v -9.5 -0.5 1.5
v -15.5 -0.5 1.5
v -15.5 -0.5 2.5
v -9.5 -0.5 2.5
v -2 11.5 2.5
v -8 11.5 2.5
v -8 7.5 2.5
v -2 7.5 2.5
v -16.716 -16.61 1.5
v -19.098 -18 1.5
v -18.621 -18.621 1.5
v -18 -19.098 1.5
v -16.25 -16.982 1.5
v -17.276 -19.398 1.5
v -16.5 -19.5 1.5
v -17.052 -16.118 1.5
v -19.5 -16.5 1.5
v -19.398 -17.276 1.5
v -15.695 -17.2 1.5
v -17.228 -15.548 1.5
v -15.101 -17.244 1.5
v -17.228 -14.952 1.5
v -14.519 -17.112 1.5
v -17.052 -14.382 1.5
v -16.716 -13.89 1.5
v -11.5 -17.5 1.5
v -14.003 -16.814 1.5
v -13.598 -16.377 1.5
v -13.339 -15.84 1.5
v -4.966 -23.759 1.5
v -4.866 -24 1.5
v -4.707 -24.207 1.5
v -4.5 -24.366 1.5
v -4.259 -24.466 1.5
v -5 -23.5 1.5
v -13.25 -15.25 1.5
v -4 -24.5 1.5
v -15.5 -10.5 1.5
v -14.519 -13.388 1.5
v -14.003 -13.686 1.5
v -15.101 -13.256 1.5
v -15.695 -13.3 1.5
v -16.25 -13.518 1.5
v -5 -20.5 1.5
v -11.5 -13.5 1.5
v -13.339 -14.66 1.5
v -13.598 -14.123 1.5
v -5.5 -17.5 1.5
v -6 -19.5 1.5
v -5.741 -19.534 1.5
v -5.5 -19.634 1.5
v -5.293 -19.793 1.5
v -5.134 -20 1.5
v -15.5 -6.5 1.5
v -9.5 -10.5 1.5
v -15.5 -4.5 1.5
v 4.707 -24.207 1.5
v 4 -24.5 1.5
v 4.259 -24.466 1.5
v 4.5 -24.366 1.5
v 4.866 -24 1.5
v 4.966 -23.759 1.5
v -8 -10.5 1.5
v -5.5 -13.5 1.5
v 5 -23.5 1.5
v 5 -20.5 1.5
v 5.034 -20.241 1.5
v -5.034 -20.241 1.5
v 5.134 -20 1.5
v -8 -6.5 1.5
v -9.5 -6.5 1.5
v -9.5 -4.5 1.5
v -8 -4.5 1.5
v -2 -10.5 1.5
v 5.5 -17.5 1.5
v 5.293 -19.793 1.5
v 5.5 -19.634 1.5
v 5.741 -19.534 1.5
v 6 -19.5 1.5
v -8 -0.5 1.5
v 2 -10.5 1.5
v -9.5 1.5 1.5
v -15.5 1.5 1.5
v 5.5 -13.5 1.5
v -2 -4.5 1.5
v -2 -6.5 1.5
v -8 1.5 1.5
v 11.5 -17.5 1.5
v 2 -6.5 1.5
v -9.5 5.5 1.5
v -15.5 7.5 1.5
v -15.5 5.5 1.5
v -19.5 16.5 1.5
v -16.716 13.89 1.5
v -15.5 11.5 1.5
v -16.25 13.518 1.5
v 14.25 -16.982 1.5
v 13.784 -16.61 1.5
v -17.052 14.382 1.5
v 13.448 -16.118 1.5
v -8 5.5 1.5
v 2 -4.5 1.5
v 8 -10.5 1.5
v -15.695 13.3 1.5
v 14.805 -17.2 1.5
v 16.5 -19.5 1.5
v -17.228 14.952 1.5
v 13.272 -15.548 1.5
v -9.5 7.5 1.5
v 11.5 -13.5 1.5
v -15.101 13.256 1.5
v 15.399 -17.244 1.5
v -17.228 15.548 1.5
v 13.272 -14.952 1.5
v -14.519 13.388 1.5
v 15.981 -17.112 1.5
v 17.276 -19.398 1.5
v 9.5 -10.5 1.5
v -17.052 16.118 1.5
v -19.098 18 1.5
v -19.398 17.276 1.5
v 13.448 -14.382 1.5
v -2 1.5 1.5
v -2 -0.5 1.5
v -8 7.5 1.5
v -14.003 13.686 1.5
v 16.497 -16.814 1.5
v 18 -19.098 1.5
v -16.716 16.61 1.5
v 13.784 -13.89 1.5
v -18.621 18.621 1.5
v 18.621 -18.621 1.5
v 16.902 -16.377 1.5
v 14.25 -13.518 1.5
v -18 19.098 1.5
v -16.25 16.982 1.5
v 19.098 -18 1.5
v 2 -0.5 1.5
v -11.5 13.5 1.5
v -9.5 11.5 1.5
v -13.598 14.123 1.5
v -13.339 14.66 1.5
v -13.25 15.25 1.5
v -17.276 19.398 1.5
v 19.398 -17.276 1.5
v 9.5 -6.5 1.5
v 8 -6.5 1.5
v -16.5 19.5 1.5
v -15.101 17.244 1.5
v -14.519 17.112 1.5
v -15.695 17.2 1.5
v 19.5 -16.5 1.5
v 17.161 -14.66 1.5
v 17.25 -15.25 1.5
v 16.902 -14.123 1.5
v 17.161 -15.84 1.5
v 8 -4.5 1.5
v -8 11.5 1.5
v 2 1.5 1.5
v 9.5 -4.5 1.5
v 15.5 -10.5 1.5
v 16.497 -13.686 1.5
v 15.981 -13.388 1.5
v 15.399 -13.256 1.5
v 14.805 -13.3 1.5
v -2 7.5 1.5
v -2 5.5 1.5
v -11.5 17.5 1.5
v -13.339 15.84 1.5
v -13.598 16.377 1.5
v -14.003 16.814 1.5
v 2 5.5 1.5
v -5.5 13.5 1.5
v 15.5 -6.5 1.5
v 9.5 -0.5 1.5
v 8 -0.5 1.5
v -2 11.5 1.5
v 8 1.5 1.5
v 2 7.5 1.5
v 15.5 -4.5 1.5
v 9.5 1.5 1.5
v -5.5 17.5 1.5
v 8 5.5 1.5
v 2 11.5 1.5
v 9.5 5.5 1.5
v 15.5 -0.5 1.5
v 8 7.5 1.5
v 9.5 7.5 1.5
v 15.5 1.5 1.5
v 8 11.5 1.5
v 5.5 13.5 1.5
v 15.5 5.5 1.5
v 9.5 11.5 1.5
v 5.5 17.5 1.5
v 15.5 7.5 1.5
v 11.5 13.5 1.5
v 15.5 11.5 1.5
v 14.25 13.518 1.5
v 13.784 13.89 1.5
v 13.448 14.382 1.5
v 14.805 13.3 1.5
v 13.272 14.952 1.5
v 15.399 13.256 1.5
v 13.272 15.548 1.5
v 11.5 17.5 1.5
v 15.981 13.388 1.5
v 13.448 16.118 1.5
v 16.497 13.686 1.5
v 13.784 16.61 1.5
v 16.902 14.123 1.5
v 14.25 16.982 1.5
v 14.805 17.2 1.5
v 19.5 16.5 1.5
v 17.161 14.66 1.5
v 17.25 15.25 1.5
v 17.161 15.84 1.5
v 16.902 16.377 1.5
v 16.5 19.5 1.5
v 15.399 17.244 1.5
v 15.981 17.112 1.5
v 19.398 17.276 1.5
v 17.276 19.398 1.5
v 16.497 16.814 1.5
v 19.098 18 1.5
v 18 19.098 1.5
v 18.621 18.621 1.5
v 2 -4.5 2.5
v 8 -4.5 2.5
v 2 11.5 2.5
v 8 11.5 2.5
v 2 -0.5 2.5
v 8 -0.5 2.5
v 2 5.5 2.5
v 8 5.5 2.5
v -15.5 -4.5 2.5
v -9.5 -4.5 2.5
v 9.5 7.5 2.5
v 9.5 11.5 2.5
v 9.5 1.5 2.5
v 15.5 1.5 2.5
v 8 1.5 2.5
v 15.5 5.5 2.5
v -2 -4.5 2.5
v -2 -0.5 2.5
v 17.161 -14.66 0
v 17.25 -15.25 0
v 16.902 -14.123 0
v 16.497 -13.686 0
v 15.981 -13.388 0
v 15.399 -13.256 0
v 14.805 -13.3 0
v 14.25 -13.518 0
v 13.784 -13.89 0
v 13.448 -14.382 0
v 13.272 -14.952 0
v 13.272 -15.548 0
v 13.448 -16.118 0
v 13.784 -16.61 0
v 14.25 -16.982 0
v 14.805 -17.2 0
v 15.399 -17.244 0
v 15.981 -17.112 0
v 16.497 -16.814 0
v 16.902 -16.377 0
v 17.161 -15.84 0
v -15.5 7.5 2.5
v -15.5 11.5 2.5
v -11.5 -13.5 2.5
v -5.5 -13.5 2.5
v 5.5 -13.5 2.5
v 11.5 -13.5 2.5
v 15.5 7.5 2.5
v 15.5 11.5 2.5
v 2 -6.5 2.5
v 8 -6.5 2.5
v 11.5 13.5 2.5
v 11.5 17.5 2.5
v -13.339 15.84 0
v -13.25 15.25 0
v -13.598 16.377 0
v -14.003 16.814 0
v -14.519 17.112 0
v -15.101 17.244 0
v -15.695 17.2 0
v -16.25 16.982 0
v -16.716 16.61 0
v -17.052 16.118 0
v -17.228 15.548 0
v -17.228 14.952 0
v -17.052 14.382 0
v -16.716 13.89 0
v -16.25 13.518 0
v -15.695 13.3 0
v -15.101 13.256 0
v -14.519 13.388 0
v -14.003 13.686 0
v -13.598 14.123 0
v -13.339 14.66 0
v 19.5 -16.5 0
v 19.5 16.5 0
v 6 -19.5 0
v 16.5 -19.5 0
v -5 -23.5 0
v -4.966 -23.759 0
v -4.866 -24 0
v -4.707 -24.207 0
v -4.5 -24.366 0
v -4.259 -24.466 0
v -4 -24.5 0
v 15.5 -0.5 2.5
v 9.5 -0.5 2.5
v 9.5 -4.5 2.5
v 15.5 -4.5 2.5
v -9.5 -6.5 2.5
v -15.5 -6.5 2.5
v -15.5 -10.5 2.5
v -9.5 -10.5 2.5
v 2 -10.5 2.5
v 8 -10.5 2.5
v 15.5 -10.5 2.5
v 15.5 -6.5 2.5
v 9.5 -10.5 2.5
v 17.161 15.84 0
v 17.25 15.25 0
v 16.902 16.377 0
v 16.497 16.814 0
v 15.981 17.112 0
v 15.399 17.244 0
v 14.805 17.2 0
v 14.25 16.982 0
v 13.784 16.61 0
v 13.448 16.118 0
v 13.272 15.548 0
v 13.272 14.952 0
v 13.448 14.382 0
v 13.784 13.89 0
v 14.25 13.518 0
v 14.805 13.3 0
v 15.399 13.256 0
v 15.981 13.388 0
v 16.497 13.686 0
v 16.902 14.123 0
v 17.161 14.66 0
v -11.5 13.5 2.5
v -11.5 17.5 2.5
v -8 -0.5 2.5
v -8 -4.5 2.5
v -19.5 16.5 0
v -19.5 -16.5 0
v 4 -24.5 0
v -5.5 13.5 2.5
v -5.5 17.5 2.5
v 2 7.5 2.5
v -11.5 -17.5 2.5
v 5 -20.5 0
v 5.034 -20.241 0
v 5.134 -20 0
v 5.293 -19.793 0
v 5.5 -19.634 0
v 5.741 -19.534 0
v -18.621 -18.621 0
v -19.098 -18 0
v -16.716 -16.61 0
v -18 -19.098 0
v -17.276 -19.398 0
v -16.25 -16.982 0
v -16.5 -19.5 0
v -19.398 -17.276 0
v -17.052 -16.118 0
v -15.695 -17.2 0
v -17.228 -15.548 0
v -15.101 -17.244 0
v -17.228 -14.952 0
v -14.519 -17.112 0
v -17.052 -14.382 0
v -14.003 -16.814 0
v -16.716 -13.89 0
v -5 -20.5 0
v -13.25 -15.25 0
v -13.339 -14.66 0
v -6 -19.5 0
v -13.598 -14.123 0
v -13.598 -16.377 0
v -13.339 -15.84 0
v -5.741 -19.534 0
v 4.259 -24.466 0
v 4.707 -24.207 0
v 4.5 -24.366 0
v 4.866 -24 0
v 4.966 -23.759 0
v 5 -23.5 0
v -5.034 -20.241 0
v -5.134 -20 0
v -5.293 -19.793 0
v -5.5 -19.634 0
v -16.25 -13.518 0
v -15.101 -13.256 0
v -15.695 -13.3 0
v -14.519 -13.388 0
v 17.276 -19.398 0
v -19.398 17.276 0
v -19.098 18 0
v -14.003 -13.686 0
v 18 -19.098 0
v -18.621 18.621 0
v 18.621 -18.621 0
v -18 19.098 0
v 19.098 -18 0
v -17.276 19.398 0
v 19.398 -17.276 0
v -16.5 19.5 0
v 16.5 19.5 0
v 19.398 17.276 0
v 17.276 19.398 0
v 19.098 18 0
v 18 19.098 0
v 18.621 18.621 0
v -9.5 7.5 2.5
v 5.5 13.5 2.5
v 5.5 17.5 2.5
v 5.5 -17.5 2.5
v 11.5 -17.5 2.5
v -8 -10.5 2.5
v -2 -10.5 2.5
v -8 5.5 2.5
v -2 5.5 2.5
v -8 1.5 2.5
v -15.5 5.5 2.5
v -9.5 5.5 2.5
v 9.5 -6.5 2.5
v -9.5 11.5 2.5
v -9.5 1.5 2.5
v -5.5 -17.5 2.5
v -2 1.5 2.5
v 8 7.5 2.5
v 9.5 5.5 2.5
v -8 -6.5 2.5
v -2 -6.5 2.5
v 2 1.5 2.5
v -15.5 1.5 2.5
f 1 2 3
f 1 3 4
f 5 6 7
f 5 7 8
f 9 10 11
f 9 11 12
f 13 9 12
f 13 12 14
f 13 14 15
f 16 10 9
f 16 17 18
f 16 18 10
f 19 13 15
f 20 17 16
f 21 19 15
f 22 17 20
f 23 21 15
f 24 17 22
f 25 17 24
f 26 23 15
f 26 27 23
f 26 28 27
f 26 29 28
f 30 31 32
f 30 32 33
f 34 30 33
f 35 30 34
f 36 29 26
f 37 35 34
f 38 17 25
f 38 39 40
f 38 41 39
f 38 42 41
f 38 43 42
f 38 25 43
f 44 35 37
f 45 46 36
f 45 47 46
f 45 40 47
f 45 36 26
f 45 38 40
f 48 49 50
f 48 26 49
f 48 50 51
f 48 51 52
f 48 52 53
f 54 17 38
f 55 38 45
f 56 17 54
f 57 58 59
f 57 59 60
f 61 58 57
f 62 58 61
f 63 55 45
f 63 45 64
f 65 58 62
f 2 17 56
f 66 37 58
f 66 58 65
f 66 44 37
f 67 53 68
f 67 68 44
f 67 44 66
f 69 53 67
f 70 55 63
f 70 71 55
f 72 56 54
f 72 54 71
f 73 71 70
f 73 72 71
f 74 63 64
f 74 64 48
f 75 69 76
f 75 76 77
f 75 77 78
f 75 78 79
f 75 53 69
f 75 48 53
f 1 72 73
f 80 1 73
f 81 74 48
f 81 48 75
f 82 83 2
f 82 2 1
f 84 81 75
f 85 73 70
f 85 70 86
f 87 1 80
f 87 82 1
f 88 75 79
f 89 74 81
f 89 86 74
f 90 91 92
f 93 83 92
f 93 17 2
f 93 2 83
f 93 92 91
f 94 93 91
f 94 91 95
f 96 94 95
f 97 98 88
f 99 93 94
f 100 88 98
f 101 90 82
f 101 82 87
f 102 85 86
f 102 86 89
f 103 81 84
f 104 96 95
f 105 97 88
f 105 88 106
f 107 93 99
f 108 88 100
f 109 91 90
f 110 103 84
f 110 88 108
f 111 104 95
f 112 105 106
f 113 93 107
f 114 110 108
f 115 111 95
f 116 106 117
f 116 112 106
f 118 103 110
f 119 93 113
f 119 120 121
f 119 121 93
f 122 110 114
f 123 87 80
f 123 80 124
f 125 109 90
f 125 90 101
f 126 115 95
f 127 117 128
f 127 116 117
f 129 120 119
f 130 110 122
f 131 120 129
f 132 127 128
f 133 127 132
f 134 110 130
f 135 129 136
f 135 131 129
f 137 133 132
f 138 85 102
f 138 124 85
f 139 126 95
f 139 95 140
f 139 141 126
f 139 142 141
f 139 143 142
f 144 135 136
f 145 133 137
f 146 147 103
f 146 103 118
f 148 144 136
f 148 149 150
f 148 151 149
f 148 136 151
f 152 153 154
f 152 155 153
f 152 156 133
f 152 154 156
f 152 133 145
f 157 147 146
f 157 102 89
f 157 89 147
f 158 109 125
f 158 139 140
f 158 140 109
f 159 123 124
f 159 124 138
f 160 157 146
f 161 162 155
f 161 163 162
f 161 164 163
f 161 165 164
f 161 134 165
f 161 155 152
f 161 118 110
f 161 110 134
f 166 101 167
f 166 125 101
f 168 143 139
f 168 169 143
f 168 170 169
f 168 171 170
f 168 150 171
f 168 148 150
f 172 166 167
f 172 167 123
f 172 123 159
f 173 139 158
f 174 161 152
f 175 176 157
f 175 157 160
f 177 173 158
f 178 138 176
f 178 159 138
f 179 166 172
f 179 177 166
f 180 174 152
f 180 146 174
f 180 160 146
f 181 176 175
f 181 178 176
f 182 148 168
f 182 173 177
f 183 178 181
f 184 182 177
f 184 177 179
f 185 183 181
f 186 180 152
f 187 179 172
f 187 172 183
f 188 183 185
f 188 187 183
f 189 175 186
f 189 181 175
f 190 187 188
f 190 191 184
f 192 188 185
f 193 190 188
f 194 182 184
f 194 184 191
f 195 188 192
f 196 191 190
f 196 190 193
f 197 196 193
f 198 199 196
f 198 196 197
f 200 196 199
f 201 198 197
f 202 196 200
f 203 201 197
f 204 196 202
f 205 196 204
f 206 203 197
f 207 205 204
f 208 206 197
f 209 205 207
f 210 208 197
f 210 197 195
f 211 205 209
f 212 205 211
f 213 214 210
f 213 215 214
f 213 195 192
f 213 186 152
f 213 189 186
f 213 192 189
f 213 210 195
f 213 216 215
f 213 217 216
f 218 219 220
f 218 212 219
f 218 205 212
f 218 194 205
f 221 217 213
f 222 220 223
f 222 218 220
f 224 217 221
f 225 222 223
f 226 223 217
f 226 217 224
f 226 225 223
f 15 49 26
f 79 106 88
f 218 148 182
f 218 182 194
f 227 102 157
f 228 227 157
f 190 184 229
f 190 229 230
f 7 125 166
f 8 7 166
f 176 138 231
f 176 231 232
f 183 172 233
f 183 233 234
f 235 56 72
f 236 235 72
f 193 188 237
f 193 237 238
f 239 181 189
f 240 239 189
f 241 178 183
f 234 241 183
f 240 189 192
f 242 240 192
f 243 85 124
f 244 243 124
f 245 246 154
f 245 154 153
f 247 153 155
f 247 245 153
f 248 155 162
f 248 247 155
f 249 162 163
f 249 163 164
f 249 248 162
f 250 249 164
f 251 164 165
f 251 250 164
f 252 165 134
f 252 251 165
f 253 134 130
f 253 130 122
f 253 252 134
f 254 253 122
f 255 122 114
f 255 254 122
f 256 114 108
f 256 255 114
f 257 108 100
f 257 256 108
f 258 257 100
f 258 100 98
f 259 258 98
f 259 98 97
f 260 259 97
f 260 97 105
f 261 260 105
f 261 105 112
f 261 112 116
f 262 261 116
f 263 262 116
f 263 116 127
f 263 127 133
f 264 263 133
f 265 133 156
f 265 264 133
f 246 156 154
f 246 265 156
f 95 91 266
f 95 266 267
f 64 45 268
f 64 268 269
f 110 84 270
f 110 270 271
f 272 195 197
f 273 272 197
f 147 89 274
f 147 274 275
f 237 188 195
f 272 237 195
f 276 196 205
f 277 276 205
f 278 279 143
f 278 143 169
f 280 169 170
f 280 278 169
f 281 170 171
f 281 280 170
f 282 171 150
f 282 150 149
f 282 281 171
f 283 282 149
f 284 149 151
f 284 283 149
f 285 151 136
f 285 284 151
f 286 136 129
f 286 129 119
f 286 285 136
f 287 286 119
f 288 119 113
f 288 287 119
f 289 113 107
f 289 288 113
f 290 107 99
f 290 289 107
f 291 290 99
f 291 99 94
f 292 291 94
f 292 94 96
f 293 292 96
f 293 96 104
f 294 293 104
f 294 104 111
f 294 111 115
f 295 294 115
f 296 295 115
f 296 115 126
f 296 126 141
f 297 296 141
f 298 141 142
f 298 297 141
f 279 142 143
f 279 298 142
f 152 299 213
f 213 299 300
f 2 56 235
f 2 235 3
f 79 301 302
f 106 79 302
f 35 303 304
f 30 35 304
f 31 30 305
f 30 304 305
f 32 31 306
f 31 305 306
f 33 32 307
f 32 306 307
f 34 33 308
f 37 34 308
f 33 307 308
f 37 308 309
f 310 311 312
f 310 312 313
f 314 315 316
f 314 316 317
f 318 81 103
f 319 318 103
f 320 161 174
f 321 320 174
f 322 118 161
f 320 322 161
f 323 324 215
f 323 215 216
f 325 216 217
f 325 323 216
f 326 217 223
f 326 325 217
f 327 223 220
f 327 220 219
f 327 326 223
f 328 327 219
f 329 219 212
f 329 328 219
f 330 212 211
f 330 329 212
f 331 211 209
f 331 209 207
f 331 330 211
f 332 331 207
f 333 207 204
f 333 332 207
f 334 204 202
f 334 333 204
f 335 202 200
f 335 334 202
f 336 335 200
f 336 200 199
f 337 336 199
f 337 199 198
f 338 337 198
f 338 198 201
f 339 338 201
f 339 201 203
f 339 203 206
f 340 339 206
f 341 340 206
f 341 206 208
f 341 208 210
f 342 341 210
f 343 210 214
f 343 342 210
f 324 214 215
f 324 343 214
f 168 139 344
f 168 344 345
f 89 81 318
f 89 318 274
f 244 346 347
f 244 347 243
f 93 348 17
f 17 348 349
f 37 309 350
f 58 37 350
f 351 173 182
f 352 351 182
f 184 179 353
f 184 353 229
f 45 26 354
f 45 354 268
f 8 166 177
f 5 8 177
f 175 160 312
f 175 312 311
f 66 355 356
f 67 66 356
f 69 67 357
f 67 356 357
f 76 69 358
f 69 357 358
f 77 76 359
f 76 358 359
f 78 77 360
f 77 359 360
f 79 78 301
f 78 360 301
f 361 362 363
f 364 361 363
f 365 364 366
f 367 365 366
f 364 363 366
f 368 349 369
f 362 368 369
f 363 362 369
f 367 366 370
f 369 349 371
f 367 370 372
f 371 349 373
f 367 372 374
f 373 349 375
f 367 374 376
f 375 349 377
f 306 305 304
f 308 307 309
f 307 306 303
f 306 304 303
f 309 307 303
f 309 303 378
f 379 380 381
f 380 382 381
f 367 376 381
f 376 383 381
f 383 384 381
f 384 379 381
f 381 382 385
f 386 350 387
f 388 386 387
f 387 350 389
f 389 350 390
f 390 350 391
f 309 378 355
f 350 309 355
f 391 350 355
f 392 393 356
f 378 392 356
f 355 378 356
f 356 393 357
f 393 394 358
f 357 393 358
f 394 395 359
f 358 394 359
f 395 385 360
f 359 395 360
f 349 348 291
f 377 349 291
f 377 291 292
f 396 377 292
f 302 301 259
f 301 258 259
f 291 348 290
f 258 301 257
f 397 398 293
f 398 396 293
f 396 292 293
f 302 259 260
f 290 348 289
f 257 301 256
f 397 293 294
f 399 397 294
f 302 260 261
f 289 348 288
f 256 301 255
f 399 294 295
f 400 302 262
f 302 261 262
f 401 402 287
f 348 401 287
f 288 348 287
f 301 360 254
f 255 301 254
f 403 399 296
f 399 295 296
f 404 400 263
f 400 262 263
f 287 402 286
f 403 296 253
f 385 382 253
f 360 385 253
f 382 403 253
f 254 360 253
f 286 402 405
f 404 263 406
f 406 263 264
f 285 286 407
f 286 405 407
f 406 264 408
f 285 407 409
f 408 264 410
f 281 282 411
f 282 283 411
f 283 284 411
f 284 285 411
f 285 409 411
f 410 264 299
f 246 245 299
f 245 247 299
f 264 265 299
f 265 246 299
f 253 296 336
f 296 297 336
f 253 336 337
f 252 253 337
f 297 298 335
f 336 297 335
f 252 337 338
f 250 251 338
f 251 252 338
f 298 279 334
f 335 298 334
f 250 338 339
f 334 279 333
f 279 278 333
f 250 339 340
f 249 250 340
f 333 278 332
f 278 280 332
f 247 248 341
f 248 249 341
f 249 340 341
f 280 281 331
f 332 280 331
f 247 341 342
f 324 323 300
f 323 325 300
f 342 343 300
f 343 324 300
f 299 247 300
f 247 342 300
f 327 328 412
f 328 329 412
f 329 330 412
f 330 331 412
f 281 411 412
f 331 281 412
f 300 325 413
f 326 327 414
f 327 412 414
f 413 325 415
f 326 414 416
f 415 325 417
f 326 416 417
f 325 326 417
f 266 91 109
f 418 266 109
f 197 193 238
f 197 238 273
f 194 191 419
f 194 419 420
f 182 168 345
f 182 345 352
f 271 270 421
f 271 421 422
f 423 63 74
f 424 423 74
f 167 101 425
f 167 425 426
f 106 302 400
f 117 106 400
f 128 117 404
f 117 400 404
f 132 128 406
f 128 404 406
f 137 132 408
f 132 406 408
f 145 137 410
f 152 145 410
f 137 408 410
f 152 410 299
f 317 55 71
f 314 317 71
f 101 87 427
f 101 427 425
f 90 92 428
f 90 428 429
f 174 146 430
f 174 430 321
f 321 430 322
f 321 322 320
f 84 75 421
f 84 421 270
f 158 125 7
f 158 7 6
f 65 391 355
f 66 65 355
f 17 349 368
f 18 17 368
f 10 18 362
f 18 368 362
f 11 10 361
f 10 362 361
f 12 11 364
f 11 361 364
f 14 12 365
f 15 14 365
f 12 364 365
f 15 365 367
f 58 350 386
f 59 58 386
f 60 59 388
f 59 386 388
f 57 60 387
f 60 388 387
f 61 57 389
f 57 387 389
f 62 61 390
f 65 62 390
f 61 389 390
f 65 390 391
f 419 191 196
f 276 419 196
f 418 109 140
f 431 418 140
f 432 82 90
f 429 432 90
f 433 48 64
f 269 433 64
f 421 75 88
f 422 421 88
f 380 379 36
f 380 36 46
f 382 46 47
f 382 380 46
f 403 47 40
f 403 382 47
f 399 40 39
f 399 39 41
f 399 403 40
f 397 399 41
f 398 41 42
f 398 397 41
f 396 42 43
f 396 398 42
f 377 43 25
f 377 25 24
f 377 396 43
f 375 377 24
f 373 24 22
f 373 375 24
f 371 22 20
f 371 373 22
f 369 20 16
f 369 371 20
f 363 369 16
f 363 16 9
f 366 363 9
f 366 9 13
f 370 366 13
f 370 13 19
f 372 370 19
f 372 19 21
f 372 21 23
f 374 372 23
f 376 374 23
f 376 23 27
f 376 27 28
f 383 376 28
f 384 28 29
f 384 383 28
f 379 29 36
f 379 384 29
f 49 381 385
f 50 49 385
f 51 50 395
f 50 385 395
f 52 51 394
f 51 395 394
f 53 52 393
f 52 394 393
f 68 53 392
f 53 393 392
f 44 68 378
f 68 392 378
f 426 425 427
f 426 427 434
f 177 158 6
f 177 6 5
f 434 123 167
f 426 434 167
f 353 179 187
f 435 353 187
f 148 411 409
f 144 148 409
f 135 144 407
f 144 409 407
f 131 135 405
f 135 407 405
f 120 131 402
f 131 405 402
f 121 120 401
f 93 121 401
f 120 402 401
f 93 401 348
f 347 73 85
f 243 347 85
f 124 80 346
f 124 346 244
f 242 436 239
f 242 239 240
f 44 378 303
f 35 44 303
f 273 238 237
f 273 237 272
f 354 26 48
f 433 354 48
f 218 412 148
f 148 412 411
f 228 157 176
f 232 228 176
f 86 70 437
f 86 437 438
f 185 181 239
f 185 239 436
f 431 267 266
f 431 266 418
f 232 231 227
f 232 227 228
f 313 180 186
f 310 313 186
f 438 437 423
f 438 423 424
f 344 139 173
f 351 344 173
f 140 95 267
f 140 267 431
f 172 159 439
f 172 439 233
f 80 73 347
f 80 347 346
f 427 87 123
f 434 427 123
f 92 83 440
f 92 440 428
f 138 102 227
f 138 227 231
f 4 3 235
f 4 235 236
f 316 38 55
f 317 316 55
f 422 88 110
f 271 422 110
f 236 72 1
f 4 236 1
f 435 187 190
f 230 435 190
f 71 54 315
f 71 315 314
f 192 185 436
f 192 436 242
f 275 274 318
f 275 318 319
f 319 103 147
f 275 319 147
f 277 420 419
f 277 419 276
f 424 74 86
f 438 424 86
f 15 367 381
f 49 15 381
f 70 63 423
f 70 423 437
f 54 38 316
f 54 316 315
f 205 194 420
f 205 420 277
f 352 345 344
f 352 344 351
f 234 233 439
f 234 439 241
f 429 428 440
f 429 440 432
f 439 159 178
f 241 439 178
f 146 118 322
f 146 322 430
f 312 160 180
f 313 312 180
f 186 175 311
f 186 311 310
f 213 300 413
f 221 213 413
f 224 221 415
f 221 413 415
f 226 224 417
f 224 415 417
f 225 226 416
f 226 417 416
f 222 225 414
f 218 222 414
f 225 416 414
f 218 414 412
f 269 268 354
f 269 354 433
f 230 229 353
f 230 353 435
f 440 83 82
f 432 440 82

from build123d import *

# Parameters (mm, degrees)
SKETCH2_R           = 2
BOSS_EXTRUDE1_DEPTH = 1.5
SKETCH3_W           = 6
SKETCH3_H           = 4
BOSS_EXTRUDE2_DEPTH = 1


with BuildPart() as part:
    # Sketch2 → Boss-Extrude1 (new body)
    with BuildSketch(Plane.XY):
        with BuildLine():
            Line((-16.5, -19.5), (-6, -19.5))
            ThreePointArc((-6, -19.5), (-5.292893219, -19.792893219), (-5, -20.5))
            Line((-5, -20.5), (-5, -23.5))
            ThreePointArc((-5, -23.5), (-4.707106781, -24.207106781), (-4, -24.5))
            Line((-4, -24.5), (4, -24.5))
            ThreePointArc((4, -24.5), (4.707106781, -24.207106781), (5, -23.5))
            Line((5, -23.5), (5, -20.5))
            ThreePointArc((5, -20.5), (5.292893219, -19.792893219), (6, -19.5))
            Line((6, -19.5), (16.5, -19.5))
            ThreePointArc((16.5, -19.5), (18.621320344, -18.621320344), (19.5, -16.5))
            Line((19.5, -16.5), (19.5, 16.5))
            ThreePointArc((19.5, 16.5), (18.621320344, 18.621320344), (16.5, 19.5))
            Line((16.5, 19.5), (-16.5, 19.5))
            ThreePointArc((-16.5, 19.5), (-18.621320344, 18.621320344), (-19.5, 16.5))
            Line((-19.5, 16.5), (-19.5, -16.5))
            ThreePointArc((-19.5, -16.5), (-18.621320344, -18.621320344), (-16.5, -19.5))
        make_face()
        with Locations((15.25, 15.25)):
            Circle(SKETCH2_R, mode=Mode.SUBTRACT)
        with Locations((15.25, -15.25)):
            Circle(SKETCH2_R, mode=Mode.SUBTRACT)
        with Locations((-15.25, -15.25)):
            Circle(SKETCH2_R, mode=Mode.SUBTRACT)
        with Locations((-15.25, 15.25)):
            Circle(SKETCH2_R, mode=Mode.SUBTRACT)
    extrude(amount=BOSS_EXTRUDE1_DEPTH)

    # Sketch3 → Boss-Extrude2 (add)
    with BuildSketch(Plane.XY.offset(1.5)):
        with Locations((-5, 3.5)):
            Rectangle(SKETCH3_W, SKETCH3_H)
        with Locations((-5, 9.5)):
            Rectangle(SKETCH3_W, SKETCH3_H)
        with Locations((-5, -2.5)):
            Rectangle(SKETCH3_W, SKETCH3_H)
        with Locations((-5, -8.5)):
            Rectangle(SKETCH3_W, SKETCH3_H)
        with Locations((-12.5, 9.5)):
            Rectangle(SKETCH3_W, SKETCH3_H)
        with Locations((-12.5, 3.5)):
            Rectangle(SKETCH3_W, SKETCH3_H)
        with Locations((-12.5, -2.5)):
            Rectangle(SKETCH3_W, SKETCH3_H)
        with Locations((-12.5, -8.5)):
            Rectangle(SKETCH3_W, SKETCH3_H)
        with Locations((12.5, -8.5)):
            Rectangle(SKETCH3_W, SKETCH3_H)
        with Locations((12.5, -2.5)):
            Rectangle(SKETCH3_W, SKETCH3_H)
        with Locations((12.5, 3.5)):
            Rectangle(SKETCH3_W, SKETCH3_H)
        with Locations((12.5, 9.5)):
            Rectangle(SKETCH3_W, SKETCH3_H)
        with Locations((5, -8.5)):
            Rectangle(SKETCH3_W, SKETCH3_H)
        with Locations((5, -2.5)):
            Rectangle(SKETCH3_W, SKETCH3_H)
        with Locations((5, 3.5)):
            Rectangle(SKETCH3_W, SKETCH3_H)
        with Locations((5, 9.5)):
            Rectangle(SKETCH3_W, SKETCH3_H)
        with Locations((8.5, 15.5)):
            Rectangle(SKETCH3_W, SKETCH3_H)
        with Locations((-8.5, 15.5)):
            Rectangle(SKETCH3_W, SKETCH3_H)
        with Locations((8.5, -15.5)):
            Rectangle(SKETCH3_W, SKETCH3_H)
        with Locations((-8.5, -15.5)):
            Rectangle(SKETCH3_W, SKETCH3_H)
    extrude(amount=BOSS_EXTRUDE2_DEPTH)


solid = part.part
